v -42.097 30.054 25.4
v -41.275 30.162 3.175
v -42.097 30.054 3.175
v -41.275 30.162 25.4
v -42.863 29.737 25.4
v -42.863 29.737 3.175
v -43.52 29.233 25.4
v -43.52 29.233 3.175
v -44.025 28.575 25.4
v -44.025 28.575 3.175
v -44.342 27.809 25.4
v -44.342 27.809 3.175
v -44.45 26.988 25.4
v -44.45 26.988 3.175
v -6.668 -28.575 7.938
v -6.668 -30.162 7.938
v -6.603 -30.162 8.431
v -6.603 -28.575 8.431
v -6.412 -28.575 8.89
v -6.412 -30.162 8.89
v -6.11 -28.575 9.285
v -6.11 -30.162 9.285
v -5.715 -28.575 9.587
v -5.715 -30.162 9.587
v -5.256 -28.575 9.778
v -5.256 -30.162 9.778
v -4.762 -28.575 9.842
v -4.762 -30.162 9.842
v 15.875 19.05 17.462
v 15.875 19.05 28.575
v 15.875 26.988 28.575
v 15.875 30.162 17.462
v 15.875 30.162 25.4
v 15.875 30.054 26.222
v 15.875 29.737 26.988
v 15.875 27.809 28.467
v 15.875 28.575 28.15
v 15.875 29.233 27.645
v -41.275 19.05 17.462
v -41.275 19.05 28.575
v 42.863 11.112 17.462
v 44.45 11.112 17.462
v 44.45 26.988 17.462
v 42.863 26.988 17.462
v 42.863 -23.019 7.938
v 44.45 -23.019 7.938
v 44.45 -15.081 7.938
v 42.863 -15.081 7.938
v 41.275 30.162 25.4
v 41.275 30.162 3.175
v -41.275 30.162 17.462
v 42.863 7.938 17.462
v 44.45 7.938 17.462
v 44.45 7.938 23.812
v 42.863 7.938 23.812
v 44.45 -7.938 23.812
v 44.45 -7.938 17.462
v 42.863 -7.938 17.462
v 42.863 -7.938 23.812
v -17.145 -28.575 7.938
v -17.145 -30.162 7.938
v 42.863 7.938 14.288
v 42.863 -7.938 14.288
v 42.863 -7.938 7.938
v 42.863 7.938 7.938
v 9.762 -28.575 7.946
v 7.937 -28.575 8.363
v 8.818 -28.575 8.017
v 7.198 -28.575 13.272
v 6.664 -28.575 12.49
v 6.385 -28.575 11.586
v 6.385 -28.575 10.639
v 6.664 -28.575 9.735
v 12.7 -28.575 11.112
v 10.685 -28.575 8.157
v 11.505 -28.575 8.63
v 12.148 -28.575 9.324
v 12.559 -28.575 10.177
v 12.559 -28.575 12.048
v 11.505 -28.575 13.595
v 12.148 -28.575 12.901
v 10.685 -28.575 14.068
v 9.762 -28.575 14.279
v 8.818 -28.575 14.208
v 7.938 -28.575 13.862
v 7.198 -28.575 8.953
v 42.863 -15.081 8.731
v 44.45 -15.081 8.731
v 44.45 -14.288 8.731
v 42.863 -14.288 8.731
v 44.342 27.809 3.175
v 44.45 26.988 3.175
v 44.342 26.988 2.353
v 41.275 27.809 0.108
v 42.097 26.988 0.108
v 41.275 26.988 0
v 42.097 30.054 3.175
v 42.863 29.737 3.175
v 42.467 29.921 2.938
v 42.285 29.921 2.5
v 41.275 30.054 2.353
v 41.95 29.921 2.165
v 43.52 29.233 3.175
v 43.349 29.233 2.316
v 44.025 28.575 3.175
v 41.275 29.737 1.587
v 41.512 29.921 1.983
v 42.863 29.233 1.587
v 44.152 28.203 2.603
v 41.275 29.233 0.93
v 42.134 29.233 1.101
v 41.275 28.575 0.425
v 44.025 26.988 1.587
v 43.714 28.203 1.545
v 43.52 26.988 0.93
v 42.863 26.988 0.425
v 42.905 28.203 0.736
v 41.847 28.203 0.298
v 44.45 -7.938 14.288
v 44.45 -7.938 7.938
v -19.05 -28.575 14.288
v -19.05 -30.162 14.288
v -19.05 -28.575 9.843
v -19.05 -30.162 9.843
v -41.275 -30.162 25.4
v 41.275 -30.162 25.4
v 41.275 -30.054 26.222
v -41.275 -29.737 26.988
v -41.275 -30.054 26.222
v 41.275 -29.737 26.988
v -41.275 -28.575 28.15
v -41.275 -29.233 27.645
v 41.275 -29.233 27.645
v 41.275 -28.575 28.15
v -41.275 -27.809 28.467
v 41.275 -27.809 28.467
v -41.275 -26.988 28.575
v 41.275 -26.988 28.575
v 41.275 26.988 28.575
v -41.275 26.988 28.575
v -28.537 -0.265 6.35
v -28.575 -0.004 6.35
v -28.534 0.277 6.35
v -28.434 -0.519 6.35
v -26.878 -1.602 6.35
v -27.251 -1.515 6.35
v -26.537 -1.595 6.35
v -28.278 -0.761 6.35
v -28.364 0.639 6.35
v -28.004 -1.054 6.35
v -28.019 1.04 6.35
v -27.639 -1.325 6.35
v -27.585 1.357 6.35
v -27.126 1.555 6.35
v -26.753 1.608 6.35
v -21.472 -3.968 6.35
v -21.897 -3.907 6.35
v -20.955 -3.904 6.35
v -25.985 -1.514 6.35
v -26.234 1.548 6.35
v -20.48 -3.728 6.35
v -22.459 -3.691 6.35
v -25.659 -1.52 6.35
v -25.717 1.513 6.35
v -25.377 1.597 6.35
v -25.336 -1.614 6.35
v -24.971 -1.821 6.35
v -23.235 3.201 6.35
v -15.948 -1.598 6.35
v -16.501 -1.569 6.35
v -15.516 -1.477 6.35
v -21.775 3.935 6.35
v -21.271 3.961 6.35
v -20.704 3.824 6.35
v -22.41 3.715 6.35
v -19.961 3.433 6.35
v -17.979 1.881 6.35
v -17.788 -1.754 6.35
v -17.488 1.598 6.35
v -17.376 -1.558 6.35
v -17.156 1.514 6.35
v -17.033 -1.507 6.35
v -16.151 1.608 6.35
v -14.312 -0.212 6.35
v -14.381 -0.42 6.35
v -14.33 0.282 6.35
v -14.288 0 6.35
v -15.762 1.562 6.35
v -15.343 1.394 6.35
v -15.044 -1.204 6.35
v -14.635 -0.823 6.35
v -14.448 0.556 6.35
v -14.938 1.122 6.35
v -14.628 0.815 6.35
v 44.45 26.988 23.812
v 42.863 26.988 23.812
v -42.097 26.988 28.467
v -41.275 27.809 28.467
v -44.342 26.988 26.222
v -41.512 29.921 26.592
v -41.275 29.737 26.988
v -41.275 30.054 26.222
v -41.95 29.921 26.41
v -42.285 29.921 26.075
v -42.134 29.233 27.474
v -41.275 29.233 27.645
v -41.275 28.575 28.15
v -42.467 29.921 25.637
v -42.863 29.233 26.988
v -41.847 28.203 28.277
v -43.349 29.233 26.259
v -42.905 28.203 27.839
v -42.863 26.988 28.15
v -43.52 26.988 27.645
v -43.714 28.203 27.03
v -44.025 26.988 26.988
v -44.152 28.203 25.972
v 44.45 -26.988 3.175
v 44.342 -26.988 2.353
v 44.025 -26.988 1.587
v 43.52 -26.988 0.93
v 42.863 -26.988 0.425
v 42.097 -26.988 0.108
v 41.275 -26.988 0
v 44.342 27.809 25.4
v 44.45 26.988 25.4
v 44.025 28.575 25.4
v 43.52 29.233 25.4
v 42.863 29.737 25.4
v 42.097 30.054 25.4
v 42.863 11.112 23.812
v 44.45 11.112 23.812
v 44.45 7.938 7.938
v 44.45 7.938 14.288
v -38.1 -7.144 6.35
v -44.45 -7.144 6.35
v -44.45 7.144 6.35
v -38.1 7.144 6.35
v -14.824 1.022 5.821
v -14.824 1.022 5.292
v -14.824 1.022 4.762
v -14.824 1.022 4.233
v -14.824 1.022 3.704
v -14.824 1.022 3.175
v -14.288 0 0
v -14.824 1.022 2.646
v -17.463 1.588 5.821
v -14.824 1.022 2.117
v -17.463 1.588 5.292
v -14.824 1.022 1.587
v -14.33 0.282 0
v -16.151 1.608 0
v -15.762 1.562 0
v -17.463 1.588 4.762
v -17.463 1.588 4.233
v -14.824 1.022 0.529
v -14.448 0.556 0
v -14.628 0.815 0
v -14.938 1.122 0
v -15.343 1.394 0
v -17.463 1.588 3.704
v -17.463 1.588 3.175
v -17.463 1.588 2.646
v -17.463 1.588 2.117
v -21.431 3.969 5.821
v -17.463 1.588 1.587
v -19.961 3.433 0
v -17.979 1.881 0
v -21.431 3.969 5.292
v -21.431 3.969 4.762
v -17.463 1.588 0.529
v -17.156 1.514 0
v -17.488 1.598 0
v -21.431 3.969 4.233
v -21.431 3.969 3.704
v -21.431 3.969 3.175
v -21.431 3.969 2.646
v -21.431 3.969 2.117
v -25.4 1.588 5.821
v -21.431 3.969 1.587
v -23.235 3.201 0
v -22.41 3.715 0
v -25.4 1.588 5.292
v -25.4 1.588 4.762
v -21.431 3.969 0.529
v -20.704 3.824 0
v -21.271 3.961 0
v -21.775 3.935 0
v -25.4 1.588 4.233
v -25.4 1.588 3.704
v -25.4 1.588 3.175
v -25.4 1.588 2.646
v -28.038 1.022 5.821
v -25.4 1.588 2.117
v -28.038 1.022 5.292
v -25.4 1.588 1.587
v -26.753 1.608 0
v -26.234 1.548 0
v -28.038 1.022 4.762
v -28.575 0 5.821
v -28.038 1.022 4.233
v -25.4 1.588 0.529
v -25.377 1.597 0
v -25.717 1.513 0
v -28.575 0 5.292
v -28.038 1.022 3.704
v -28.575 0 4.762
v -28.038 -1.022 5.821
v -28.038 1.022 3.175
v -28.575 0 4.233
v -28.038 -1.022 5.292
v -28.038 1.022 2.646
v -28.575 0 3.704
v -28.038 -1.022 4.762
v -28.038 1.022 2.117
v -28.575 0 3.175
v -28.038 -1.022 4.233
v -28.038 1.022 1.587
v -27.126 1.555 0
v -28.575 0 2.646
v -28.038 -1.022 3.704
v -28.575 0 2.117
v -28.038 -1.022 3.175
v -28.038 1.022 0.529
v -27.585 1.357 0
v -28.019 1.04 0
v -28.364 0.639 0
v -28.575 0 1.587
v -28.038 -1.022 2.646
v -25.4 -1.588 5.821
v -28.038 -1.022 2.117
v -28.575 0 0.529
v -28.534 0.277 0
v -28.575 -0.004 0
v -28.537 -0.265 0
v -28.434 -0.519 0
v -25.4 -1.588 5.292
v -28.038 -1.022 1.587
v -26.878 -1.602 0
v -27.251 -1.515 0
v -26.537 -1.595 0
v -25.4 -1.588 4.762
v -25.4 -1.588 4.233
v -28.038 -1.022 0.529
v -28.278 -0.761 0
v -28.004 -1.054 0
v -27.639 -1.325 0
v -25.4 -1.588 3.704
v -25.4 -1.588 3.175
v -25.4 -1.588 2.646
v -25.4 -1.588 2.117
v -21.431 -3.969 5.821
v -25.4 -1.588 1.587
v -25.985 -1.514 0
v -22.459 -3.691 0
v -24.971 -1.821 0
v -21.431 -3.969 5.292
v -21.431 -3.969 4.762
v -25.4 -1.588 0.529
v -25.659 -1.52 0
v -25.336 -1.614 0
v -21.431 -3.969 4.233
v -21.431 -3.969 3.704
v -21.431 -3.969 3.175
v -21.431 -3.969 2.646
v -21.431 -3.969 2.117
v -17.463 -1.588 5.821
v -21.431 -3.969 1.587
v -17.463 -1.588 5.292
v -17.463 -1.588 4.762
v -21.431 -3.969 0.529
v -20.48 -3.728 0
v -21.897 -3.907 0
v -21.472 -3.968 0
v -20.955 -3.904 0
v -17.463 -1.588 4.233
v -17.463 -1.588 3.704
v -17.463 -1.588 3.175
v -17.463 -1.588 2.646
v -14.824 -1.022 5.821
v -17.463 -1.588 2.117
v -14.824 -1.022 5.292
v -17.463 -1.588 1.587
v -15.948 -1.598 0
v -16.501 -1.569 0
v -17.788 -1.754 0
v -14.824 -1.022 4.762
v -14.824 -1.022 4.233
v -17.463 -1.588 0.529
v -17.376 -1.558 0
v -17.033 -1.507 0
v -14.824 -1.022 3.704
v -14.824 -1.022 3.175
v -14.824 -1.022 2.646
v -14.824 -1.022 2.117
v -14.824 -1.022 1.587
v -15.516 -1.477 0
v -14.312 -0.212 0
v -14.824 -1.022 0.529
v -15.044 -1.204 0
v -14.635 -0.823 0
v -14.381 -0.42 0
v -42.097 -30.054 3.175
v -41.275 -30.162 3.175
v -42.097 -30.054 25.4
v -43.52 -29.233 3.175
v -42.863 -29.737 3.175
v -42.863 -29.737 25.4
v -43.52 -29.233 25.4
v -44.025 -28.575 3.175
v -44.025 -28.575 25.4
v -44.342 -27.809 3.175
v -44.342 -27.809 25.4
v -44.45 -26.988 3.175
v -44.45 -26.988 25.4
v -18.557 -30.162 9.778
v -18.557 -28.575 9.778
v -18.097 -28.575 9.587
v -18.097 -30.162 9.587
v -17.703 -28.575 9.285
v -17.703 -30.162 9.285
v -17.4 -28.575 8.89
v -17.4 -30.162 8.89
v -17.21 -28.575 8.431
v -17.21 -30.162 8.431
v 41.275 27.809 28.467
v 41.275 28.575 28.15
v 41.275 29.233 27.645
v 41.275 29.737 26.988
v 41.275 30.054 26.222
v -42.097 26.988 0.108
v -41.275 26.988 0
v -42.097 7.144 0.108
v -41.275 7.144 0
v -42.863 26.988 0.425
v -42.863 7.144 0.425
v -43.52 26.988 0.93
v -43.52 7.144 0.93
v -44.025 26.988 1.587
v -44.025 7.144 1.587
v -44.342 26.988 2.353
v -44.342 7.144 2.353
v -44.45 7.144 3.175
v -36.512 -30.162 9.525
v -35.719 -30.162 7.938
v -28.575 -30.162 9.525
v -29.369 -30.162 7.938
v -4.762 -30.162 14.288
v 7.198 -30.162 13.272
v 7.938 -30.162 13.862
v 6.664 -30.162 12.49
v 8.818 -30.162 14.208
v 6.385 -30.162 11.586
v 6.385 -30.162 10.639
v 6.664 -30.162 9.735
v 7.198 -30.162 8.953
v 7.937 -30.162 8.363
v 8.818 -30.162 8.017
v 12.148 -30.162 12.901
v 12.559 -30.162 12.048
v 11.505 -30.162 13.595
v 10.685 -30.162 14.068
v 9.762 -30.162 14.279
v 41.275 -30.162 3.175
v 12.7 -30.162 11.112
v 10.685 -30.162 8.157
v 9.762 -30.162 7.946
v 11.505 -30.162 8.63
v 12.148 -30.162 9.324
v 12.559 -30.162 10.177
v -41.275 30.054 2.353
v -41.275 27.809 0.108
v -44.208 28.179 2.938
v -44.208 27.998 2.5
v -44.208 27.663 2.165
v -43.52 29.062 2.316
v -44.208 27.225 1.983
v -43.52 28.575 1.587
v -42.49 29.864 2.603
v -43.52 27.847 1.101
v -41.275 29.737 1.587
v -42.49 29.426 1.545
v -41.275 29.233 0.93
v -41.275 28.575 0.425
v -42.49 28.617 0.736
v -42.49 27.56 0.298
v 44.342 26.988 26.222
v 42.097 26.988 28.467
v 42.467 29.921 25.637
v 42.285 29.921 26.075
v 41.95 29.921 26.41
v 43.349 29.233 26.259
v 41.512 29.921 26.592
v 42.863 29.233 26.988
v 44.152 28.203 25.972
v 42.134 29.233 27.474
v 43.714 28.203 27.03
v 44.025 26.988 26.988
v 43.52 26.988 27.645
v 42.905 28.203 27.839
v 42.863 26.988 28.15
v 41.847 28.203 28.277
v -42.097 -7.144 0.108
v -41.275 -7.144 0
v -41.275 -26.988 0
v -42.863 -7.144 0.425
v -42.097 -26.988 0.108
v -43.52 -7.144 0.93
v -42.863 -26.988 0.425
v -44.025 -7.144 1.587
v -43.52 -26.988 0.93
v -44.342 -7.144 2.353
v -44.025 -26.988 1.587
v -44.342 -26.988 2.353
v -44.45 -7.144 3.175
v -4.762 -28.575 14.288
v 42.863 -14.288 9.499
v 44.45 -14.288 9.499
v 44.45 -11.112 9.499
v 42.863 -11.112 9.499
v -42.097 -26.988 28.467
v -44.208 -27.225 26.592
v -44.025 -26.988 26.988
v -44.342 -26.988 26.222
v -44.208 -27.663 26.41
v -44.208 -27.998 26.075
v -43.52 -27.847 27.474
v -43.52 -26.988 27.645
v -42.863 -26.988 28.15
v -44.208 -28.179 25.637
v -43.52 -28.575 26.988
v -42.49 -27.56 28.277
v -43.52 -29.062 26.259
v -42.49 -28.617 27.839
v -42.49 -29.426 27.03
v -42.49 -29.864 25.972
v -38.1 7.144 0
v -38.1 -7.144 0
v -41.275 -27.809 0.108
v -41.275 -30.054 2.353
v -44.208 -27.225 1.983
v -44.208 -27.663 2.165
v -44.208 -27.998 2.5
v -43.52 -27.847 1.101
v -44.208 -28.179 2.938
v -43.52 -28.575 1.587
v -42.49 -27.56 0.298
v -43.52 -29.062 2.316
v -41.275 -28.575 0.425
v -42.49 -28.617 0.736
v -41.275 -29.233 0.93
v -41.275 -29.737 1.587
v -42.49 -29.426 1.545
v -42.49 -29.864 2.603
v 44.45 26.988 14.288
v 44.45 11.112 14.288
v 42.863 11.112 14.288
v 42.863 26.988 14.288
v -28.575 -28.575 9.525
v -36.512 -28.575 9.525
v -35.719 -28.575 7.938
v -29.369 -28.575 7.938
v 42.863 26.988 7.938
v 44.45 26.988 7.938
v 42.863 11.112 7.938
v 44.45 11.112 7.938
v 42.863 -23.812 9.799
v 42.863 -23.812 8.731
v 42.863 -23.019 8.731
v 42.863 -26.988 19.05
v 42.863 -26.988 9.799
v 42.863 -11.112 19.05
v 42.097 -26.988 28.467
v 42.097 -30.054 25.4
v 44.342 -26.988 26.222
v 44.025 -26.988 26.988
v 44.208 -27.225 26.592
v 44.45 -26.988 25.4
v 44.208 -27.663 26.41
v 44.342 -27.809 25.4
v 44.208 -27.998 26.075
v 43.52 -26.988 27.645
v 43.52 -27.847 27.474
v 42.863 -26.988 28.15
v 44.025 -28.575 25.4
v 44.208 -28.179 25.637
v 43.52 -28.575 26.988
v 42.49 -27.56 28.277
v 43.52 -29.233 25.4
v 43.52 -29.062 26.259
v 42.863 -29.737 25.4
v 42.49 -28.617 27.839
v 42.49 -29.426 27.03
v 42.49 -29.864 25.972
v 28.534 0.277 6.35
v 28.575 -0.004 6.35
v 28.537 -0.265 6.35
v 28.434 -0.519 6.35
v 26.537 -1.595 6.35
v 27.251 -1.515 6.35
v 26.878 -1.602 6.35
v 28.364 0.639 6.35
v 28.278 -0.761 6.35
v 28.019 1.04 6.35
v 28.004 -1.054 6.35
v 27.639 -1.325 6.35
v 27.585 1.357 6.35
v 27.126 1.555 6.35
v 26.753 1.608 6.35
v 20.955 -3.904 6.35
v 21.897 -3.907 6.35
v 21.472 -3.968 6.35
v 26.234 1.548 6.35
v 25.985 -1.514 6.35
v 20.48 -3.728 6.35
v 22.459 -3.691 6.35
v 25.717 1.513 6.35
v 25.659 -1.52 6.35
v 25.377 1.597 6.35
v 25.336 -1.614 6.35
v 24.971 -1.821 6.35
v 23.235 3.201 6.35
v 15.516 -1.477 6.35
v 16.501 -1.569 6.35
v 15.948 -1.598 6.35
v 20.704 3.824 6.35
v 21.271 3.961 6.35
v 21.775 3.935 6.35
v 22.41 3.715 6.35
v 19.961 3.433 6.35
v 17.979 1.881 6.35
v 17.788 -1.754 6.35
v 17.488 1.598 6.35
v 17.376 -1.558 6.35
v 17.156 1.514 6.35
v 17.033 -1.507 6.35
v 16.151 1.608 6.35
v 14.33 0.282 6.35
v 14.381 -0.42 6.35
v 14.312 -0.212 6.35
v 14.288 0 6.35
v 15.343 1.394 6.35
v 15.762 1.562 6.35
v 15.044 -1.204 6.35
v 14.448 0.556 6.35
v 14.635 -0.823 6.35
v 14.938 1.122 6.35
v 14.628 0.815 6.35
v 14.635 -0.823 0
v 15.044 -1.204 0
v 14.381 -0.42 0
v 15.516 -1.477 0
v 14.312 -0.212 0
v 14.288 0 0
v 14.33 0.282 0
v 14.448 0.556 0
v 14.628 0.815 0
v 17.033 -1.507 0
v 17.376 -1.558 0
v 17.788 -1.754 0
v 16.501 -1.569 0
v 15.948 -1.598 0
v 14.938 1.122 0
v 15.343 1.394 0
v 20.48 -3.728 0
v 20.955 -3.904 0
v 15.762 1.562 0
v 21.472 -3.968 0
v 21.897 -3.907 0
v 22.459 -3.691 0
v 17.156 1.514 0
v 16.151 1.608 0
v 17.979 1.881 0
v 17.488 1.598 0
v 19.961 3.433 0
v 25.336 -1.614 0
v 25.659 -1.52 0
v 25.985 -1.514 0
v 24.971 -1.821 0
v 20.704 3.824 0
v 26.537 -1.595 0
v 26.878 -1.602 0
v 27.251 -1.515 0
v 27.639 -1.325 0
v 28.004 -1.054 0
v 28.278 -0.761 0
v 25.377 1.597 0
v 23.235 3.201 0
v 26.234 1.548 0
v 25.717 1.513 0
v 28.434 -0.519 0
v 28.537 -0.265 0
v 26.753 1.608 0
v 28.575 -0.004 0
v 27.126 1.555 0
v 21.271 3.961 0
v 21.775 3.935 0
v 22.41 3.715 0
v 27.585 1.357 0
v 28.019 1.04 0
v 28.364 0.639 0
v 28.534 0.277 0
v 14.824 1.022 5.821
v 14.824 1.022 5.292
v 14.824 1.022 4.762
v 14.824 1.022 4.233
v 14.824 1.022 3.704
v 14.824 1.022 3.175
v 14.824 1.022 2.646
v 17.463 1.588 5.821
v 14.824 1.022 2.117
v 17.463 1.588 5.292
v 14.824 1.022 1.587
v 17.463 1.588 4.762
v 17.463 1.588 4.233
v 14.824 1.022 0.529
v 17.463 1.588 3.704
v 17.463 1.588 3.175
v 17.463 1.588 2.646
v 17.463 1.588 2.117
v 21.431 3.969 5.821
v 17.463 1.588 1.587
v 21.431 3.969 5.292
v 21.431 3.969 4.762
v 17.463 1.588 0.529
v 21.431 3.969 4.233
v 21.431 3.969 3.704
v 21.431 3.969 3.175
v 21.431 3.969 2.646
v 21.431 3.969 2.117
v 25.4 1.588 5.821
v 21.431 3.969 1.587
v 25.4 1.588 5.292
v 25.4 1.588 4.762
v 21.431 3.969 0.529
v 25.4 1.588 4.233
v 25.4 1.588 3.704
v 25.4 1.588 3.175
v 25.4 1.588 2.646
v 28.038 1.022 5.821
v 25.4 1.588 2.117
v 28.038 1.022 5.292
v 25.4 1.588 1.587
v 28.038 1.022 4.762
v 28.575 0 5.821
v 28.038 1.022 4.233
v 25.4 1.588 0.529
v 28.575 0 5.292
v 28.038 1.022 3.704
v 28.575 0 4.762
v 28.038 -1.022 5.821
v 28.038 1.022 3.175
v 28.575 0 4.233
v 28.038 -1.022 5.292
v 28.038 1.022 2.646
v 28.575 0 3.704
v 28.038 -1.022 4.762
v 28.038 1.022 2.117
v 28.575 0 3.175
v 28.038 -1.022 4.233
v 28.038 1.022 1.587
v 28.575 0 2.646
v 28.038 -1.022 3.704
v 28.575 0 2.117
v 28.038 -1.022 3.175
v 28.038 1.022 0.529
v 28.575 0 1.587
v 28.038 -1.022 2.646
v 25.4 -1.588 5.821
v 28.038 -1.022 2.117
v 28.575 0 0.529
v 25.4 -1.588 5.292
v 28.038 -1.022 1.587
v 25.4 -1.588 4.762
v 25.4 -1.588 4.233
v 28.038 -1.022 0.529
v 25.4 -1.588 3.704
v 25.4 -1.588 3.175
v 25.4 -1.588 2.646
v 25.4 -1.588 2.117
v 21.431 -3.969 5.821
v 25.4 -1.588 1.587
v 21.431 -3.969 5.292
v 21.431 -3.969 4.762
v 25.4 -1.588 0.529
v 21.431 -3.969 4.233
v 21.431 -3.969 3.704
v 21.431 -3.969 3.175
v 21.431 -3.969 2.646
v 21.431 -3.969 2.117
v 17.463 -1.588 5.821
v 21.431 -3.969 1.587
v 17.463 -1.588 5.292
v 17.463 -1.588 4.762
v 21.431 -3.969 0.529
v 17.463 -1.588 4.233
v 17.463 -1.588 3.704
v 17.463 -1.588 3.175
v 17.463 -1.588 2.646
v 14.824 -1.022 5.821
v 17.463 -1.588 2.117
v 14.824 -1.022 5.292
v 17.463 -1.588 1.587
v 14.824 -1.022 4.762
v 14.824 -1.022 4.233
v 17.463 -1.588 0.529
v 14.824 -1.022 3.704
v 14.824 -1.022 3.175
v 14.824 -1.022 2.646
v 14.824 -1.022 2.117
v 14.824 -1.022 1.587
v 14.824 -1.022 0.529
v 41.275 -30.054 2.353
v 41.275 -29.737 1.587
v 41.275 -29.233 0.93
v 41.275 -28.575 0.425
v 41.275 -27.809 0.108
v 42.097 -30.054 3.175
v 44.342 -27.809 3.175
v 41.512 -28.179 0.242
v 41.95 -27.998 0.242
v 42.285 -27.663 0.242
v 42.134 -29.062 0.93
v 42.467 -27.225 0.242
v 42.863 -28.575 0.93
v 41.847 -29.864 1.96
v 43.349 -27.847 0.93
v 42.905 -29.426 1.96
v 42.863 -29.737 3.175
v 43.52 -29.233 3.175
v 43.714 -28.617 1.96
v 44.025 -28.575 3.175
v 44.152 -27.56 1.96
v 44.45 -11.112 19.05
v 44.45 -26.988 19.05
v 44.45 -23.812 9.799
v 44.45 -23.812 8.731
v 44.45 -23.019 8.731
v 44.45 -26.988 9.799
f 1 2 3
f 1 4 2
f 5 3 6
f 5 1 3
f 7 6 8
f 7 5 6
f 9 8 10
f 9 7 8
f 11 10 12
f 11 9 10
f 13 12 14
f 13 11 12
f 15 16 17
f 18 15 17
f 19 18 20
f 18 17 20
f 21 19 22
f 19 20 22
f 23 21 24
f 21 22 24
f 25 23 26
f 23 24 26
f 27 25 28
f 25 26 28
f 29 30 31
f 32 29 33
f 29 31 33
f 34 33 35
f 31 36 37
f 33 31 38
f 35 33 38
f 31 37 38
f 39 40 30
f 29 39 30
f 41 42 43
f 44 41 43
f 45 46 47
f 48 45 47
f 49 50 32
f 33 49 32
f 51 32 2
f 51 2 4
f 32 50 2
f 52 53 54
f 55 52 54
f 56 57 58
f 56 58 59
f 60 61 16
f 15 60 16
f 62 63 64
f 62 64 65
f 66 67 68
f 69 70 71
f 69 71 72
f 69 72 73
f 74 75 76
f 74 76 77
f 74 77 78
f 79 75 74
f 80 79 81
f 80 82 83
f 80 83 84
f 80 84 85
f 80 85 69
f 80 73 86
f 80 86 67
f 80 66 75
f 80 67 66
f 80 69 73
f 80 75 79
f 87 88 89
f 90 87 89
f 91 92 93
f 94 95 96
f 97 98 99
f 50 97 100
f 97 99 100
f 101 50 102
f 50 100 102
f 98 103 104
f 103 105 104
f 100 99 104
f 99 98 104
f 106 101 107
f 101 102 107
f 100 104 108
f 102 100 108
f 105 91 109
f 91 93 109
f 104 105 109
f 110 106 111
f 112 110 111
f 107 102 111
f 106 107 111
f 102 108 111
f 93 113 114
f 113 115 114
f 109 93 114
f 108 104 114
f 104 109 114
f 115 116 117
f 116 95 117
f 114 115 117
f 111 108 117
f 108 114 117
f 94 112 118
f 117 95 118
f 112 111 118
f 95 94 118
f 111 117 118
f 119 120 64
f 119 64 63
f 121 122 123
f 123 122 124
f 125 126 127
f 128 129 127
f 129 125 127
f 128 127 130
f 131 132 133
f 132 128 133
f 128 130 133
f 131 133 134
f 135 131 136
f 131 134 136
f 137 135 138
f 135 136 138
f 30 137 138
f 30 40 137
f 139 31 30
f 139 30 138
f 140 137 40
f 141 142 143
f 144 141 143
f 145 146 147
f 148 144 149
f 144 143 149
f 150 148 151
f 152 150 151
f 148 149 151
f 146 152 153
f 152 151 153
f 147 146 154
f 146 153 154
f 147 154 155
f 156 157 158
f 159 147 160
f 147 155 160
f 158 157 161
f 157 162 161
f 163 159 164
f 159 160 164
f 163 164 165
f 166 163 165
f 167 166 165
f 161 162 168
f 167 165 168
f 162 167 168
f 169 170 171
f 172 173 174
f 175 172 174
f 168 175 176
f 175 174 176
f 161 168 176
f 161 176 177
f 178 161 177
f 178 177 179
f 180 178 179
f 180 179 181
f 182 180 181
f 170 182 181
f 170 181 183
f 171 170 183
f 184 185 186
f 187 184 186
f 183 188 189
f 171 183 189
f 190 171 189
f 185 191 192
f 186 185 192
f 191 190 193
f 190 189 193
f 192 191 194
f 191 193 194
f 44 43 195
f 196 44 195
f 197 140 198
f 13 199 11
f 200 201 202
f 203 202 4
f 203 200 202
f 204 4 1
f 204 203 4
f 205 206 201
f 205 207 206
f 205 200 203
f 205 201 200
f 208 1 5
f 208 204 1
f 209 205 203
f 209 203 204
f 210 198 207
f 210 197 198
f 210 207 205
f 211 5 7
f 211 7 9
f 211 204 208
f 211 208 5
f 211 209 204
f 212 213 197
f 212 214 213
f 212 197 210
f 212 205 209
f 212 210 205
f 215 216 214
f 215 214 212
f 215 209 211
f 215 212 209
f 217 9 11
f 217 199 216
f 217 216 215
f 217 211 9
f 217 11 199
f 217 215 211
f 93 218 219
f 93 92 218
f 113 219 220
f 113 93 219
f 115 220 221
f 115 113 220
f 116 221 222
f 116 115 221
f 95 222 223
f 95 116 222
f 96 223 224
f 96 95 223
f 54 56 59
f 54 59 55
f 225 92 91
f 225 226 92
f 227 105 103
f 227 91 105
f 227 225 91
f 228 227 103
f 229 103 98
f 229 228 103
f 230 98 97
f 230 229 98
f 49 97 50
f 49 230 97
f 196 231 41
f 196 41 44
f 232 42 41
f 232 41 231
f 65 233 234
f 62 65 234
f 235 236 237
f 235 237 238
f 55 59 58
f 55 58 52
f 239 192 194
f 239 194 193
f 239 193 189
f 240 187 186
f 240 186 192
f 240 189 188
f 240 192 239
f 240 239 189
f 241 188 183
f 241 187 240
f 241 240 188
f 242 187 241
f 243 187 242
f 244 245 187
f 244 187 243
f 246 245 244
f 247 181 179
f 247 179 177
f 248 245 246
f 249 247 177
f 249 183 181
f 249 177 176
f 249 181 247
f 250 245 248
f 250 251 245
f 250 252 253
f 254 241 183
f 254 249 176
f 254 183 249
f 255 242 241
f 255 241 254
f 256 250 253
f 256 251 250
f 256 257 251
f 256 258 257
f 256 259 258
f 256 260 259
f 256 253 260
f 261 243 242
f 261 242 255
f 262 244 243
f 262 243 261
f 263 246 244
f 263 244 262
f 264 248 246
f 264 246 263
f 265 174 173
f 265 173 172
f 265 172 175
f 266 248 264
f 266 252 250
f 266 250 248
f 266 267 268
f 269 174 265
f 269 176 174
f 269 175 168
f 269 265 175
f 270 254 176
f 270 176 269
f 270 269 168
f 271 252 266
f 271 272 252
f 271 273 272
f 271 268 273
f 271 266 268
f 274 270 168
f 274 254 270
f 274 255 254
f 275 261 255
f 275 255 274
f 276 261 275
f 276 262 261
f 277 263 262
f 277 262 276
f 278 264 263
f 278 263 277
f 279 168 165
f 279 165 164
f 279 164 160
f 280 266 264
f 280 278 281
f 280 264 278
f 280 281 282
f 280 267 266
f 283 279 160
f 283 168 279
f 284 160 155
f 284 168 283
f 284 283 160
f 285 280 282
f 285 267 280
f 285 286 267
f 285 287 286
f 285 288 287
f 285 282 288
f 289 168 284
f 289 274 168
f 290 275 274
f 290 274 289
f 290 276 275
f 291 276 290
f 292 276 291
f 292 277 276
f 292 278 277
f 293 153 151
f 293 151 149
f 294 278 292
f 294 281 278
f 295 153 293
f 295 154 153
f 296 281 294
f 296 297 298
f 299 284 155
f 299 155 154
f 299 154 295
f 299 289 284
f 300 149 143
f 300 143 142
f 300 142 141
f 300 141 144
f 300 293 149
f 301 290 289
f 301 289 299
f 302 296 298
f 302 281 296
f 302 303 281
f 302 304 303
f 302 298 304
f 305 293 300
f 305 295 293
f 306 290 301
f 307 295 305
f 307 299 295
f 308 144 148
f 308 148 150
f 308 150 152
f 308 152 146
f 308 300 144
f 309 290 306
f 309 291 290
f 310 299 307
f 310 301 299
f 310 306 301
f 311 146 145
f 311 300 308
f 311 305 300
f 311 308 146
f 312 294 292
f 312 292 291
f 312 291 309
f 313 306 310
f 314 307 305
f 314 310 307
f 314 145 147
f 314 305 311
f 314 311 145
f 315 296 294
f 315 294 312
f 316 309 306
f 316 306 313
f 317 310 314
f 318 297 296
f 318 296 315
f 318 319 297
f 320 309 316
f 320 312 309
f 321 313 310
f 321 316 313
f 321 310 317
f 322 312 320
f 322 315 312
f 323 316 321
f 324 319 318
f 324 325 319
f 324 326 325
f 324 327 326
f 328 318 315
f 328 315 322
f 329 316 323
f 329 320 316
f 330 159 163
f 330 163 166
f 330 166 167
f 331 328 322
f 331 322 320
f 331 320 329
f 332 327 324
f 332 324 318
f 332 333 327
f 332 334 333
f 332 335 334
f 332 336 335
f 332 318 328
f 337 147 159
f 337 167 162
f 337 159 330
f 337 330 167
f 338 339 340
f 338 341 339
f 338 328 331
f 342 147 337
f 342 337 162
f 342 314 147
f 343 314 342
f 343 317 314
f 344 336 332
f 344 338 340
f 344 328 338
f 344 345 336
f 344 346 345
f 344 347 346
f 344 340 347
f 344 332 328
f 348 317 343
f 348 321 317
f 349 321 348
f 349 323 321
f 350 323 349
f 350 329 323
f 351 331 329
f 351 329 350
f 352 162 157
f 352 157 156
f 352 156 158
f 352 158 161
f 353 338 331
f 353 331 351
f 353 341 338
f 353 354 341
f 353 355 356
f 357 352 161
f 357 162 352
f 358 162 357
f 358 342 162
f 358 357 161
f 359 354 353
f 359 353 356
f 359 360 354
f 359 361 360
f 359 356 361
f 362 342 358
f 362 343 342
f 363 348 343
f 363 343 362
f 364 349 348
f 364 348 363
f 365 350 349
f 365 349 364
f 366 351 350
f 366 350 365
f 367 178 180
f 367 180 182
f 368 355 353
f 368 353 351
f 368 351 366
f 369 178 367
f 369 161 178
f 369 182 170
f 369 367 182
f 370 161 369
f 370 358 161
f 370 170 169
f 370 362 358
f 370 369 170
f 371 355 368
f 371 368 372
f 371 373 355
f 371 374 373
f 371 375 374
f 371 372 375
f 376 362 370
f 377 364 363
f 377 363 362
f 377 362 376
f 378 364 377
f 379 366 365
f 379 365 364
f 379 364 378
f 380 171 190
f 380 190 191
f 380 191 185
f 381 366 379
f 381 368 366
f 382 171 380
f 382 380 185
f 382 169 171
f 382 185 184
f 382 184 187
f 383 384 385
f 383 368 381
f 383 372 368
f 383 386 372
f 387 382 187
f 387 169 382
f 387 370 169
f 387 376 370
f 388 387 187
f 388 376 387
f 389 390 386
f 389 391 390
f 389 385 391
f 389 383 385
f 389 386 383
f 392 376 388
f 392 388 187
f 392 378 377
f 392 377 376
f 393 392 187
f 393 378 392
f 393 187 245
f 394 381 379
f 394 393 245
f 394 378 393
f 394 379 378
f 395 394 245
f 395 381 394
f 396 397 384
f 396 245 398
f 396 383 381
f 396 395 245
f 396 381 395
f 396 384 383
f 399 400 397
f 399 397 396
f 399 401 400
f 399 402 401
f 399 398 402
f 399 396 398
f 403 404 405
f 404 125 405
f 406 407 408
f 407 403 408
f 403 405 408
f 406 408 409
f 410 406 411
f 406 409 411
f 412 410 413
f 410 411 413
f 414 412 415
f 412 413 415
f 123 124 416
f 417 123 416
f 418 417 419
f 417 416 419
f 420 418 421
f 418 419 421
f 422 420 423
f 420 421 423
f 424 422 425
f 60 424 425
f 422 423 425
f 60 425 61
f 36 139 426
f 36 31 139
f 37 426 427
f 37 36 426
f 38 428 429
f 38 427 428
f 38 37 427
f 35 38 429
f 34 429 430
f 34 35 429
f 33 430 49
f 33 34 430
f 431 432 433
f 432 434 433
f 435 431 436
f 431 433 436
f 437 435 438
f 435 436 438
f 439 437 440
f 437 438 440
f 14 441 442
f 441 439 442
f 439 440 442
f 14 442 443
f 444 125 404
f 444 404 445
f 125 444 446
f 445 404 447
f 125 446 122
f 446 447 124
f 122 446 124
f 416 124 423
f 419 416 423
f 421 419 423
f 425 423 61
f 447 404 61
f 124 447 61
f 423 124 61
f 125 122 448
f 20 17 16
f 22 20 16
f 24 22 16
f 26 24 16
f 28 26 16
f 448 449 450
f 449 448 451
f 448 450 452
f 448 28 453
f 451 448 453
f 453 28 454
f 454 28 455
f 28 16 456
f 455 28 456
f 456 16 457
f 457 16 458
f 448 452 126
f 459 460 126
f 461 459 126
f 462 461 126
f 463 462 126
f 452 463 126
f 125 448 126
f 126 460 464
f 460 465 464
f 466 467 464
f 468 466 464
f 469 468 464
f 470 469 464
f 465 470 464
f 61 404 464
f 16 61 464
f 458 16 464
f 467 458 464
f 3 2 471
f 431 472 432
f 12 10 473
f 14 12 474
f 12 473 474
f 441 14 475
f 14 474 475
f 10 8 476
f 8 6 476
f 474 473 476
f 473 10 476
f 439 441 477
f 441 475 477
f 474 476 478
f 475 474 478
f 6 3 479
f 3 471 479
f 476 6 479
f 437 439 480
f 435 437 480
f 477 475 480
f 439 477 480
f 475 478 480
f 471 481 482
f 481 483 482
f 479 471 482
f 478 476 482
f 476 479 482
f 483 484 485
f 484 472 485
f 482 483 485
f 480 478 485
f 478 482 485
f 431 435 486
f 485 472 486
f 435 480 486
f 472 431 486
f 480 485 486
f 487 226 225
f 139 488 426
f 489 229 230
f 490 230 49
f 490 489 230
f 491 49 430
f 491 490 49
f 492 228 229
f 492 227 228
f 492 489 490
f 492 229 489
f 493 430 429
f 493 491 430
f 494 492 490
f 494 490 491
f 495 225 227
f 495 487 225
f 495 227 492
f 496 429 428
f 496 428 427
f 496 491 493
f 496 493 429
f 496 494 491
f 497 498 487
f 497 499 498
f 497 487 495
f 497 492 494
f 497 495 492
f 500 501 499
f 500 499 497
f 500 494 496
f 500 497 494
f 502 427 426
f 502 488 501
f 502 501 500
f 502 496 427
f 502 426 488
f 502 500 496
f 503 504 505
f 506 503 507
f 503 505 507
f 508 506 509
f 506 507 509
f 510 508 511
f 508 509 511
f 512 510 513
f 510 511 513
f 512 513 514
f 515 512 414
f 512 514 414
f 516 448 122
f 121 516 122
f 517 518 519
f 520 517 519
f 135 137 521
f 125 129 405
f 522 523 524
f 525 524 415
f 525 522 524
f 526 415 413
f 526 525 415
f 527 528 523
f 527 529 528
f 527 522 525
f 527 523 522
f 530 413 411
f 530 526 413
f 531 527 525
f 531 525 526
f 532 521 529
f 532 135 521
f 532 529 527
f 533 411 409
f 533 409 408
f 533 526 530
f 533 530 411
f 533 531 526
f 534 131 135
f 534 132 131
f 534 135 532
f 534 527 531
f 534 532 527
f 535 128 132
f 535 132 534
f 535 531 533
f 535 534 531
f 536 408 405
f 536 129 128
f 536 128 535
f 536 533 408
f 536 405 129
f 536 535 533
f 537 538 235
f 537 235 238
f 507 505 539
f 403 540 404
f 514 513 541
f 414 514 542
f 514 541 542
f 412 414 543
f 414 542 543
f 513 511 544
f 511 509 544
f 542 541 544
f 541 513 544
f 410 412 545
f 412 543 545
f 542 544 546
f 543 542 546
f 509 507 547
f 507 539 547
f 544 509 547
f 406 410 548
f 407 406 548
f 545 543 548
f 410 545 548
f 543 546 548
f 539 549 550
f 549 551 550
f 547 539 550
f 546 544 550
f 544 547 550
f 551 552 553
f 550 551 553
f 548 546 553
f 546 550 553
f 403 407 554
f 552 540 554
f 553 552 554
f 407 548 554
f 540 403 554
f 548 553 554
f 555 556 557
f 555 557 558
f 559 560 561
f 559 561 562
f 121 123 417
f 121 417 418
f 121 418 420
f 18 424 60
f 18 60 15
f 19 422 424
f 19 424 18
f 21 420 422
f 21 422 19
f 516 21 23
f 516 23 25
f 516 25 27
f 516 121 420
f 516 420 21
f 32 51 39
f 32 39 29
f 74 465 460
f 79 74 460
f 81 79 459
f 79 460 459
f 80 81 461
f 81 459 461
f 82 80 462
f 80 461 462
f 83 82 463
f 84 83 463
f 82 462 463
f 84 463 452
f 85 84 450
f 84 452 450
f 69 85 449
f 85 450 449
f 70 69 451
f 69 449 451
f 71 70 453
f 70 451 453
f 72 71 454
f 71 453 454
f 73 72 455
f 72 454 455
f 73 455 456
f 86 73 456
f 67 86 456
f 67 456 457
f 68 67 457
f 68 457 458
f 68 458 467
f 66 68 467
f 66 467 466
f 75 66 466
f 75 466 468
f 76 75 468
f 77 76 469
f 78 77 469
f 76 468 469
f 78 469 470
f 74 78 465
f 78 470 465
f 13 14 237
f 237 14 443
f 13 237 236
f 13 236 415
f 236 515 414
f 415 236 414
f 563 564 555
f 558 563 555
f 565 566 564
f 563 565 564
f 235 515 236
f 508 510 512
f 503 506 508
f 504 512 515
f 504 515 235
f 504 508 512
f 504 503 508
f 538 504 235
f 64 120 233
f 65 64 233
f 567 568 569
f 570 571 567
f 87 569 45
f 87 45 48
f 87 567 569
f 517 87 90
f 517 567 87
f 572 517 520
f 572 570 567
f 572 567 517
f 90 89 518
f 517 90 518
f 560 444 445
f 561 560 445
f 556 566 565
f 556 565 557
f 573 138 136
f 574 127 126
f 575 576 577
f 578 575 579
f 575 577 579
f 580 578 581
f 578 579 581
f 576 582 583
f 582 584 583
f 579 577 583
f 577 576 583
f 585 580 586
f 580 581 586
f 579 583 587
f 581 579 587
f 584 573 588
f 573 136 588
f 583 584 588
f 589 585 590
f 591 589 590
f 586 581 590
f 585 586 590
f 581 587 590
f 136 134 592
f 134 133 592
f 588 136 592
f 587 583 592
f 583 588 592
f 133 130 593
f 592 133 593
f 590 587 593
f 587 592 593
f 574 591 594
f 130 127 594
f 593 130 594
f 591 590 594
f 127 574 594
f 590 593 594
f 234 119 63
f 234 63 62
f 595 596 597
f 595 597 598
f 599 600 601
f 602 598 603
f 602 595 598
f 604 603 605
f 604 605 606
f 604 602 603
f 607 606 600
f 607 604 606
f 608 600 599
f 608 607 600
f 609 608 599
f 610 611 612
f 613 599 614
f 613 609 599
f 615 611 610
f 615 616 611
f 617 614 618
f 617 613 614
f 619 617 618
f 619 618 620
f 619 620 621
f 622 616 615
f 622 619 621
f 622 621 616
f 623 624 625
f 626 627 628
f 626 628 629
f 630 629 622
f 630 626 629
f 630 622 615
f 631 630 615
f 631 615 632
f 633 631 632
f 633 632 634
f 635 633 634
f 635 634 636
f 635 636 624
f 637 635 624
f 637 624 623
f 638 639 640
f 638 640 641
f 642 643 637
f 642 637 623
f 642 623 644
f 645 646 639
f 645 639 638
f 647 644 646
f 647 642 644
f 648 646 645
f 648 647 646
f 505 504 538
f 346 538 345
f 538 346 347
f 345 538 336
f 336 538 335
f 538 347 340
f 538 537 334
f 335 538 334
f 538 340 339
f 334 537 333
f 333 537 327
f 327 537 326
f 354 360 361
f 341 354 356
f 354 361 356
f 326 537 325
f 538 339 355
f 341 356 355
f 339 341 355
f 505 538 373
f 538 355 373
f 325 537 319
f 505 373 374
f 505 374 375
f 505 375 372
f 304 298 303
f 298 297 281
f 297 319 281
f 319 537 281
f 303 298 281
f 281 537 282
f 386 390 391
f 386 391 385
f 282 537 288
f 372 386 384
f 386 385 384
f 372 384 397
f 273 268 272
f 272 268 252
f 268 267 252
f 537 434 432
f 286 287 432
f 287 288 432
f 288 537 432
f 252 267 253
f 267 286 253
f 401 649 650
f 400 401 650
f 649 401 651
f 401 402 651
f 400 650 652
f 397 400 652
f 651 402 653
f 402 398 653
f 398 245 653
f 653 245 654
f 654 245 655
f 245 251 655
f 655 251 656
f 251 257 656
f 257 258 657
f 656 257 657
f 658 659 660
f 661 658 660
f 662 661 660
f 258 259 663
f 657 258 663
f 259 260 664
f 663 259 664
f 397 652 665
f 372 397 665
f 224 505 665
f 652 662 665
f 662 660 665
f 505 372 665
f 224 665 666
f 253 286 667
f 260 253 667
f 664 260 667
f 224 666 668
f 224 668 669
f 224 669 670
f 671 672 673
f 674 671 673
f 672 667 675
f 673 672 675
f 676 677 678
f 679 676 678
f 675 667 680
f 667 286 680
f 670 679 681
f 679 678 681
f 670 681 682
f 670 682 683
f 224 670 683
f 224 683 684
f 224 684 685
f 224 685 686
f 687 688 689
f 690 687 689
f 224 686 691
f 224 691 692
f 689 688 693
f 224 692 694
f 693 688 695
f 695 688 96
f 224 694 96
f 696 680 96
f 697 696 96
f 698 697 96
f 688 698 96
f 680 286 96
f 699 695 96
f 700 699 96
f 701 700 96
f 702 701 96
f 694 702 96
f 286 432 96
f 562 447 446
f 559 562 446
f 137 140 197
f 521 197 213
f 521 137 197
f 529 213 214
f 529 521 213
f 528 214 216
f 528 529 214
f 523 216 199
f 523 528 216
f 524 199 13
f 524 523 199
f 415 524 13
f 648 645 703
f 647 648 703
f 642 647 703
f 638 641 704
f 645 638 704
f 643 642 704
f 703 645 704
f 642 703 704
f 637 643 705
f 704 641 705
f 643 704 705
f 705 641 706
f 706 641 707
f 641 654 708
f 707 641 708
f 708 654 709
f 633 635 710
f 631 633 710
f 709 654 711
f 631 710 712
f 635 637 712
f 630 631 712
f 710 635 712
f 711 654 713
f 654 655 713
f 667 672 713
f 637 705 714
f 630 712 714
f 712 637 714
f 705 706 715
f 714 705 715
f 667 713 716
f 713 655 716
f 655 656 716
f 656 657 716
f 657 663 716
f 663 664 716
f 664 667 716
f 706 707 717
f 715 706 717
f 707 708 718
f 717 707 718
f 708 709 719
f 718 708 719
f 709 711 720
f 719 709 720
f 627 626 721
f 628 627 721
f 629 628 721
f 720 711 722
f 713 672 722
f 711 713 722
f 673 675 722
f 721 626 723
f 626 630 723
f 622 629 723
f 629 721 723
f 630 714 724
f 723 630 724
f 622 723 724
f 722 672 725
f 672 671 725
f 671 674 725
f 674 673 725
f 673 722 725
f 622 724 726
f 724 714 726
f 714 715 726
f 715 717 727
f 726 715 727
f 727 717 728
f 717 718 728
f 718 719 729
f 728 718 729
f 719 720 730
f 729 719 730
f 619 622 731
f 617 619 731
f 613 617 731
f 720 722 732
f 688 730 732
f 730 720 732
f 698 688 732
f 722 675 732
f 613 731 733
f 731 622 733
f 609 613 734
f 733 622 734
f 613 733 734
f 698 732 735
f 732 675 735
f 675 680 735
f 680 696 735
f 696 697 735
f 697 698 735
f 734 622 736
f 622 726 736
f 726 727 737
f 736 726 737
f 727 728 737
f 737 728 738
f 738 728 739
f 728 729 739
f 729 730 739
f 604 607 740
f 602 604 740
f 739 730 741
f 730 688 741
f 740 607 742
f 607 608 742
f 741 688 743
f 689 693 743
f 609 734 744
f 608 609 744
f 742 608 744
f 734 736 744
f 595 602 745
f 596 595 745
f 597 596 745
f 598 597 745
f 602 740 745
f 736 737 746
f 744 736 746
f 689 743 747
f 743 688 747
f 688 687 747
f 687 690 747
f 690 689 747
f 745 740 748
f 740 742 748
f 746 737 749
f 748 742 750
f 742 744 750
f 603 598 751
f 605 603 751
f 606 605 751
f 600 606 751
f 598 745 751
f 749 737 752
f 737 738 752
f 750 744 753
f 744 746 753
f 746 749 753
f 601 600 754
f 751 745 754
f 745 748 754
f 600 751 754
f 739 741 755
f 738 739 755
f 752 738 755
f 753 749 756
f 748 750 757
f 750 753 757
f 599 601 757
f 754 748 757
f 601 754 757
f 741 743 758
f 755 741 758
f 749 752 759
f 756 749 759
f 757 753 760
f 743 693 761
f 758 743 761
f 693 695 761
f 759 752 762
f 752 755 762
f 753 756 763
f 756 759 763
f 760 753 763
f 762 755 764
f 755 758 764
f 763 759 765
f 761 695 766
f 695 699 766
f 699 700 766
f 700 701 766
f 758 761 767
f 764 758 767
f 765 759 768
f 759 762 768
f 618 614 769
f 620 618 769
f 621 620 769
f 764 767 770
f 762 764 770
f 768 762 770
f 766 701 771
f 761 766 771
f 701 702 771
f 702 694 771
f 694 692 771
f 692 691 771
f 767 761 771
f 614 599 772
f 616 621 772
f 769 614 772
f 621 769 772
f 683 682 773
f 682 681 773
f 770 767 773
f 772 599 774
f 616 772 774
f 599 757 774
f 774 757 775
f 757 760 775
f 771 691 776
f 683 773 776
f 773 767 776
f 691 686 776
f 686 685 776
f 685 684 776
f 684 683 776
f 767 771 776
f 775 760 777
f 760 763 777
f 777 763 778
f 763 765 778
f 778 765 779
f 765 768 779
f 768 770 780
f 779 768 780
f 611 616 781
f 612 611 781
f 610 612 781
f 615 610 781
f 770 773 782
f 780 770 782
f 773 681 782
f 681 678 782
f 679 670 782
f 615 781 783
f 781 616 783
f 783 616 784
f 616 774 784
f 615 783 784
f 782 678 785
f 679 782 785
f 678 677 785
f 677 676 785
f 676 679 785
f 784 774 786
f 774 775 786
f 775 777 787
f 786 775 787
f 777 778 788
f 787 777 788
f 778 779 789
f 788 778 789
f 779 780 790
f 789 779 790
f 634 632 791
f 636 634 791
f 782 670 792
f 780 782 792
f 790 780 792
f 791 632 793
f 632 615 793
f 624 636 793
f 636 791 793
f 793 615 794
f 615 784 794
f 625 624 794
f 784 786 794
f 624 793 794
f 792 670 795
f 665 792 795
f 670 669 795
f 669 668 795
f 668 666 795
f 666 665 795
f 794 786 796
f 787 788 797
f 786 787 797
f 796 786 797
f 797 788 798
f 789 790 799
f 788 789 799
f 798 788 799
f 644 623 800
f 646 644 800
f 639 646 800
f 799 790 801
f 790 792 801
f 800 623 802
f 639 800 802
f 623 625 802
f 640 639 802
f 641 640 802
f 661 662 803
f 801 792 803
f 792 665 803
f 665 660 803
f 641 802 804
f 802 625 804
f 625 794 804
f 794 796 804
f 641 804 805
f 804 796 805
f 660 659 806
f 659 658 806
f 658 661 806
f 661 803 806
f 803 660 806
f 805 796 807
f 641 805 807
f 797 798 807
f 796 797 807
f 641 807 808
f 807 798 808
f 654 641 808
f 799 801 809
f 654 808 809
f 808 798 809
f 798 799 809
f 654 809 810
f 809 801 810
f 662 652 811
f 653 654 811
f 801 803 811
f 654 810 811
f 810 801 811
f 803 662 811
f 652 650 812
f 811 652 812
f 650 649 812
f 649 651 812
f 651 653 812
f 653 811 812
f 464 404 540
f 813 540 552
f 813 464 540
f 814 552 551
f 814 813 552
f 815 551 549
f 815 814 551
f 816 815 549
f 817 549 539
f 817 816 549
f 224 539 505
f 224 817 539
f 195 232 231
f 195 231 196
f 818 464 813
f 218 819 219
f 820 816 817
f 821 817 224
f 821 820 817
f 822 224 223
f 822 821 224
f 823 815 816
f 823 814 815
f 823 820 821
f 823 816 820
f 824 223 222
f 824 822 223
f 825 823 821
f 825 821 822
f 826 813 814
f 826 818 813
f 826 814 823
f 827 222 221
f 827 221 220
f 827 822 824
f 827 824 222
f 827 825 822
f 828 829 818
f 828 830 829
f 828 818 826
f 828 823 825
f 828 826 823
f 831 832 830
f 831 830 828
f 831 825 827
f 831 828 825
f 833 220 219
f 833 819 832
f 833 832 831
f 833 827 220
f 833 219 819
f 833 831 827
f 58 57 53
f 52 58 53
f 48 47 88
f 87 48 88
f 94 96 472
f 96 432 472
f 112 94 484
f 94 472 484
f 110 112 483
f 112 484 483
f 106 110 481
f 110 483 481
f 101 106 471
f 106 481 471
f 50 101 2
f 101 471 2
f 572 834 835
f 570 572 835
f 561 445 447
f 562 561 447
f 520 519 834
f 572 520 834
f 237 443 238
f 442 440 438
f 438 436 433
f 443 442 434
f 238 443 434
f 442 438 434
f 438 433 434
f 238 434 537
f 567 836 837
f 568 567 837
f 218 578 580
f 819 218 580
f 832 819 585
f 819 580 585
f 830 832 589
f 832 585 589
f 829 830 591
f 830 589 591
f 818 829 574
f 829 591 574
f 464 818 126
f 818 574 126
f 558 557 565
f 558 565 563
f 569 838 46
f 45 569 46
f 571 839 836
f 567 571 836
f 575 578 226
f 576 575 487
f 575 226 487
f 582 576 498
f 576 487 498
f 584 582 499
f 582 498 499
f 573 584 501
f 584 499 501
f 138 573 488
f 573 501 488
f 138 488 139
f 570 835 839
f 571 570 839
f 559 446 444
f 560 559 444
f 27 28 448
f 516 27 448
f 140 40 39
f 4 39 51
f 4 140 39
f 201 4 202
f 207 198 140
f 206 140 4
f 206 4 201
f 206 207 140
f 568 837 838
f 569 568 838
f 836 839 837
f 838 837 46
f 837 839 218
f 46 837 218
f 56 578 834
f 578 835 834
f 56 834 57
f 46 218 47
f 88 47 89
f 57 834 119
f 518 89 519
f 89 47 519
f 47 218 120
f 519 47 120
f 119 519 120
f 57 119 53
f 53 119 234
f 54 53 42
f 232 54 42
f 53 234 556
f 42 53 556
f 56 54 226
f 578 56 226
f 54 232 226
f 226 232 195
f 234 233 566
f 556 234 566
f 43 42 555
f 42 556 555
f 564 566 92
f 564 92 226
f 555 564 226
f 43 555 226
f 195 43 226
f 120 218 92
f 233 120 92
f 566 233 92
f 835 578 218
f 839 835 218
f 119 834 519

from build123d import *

# Parameters (mm, degrees)
F0_W     = 6.35
F0_H     = 7.14375
F1_DEPTH = 28.575
F2_DEPTH = 6.35
F4_W     = 15.875
F4_H     = 6.35
F5_DEPTH = 1.5875
F3_R     = 3.175
F6_DEPTH = 1.5875
F7_W     = 57.15
F7_H     = 11.1125
F8_DEPTH = 11.1125
F9_R     = 3.17499


# Not quite as in the source:
# - a fillet or chamfer is up to 0.001 mm smaller than in the source, because OpenCascade refuses the exact size


with BuildPart() as f1:
    # F0 (on Top) → F1 (new body)
    with BuildSketch(Plane.XY):
        Polygon((44.45, -30.1625), (44.45, 30.1625), (-44.45, 30.1625), (-44.45, 7.14375), (-38.1, 7.14375), (-38.1, 0), (-38.1, -7.14375), (-44.45, -7.14375), (-44.45, -30.1625), align=None)
        with BuildLine():
            add(Edge.make_bspline(
                [(-14.2875, 0), (-14.2875, 0.7324493897), (-15.9479784808, 2.0808128457), (-17.5976715514, 0.8021829538), (-21.43125, 5.9657530394), (-25.2648284486, 0.8021829538), (-26.9145215192, 2.0808128457), (-29.4769945213, 0), (-26.9145215192, -2.0808128457), (-25.2648284486, -0.8021829538), (-21.43125, -5.9657530394), (-17.5976715514, -0.8021829538), (-15.9479784808, -2.0808128457), (-14.2875, -0.7324493897), (-14.2875, 0)],
                knots=[0, 0, 0, 0, 0.0762961044, 0.1404532251, 0.25, 0.3595467749, 0.4237038956, 0.5, 0.5762961044, 0.6404532251, 0.75, 0.8595467749, 0.9237038956, 1, 1, 1, 1], degree=3))
        make_face(mode=Mode.SUBTRACT)
        with BuildLine():
            add(Edge.make_bspline(
                [(14.2875, 0), (14.2875, 0.7324493897), (15.9479784808, 2.0808128457), (17.5976715514, 0.8021829538), (21.43125, 5.9657530394), (25.2648284486, 0.8021829538), (26.9145215192, 2.0808128457), (29.4769945213, 0), (26.9145215192, -2.0808128457), (25.2648284486, -0.8021829538), (21.43125, -5.9657530394), (17.5976715514, -0.8021829538), (15.9479784808, -2.0808128457), (14.2875, -0.7324493897), (14.2875, 0)],
                knots=[0, 0, 0, 0, 0.0762961044, 0.1404532251, 0.25, 0.3595467749, 0.4237038956, 0.5, 0.5762961044, 0.6404532251, 0.75, 0.8595467749, 0.9237038956, 1, 1, 1, 1], degree=3))
        make_face(mode=Mode.SUBTRACT)
        with Locations((-41.275, 3.571875)):
            Rectangle(F0_W, F0_H)
        with Locations((-41.275, -3.571875)):
            Rectangle(F0_W, F0_H)
        with BuildLine():
            add(Edge.make_bspline(
                [(-14.2875, 0), (-14.2875, 0.7324493897), (-15.9479784808, 2.0808128457), (-17.5976715514, 0.8021829538), (-21.43125, 5.9657530394), (-25.2648284486, 0.8021829538), (-26.9145215192, 2.0808128457), (-29.4769945213, 0), (-26.9145215192, -2.0808128457), (-25.2648284486, -0.8021829538), (-21.43125, -5.9657530394), (-17.5976715514, -0.8021829538), (-15.9479784808, -2.0808128457), (-14.2875, -0.7324493897), (-14.2875, 0)],
                knots=[0, 0, 0, 0, 0.0762961044, 0.1404532251, 0.25, 0.3595467749, 0.4237038956, 0.5, 0.5762961044, 0.6404532251, 0.75, 0.8595467749, 0.9237038956, 1, 1, 1, 1], degree=3))
        make_face()
        with BuildLine():
            add(Edge.make_bspline(
                [(14.2875, 0), (14.2875, 0.7324493897), (15.9479784808, 2.0808128457), (17.5976715514, 0.8021829538), (21.43125, 5.9657530394), (25.2648284486, 0.8021829538), (26.9145215192, 2.0808128457), (29.4769945213, 0), (26.9145215192, -2.0808128457), (25.2648284486, -0.8021829538), (21.43125, -5.9657530394), (17.5976715514, -0.8021829538), (15.9479784808, -2.0808128457), (14.2875, -0.7324493897), (14.2875, 0)],
                knots=[0, 0, 0, 0, 0.0762961044, 0.1404532251, 0.25, 0.3595467749, 0.4237038956, 0.5, 0.5762961044, 0.6404532251, 0.75, 0.8595467749, 0.9237038956, 1, 1, 1, 1], degree=3))
        make_face()
    extrude(amount=F1_DEPTH)

    # F0 (on Top) → F2 (cut)
    with BuildSketch(Plane.XY):
        with Locations((-41.275, 3.571875)):
            Rectangle(F0_W, F0_H)
        with Locations((-41.275, -3.571875)):
            Rectangle(F0_W, F0_H)
        with BuildLine():
            add(Edge.make_bspline(
                [(-14.2875, 0), (-14.2875, 0.7324493897), (-15.9479784808, 2.0808128457), (-17.5976715514, 0.8021829538), (-21.43125, 5.9657530394), (-25.2648284486, 0.8021829538), (-26.9145215192, 2.0808128457), (-29.4769945213, 0), (-26.9145215192, -2.0808128457), (-25.2648284486, -0.8021829538), (-21.43125, -5.9657530394), (-17.5976715514, -0.8021829538), (-15.9479784808, -2.0808128457), (-14.2875, -0.7324493897), (-14.2875, 0)],
                knots=[0, 0, 0, 0, 0.0762961044, 0.1404532251, 0.25, 0.3595467749, 0.4237038956, 0.5, 0.5762961044, 0.6404532251, 0.75, 0.8595467749, 0.9237038956, 1, 1, 1, 1], degree=3))
        make_face()
        with BuildLine():
            add(Edge.make_bspline(
                [(14.2875, 0), (14.2875, 0.7324493897), (15.9479784808, 2.0808128457), (17.5976715514, 0.8021829538), (21.43125, 5.9657530394), (25.2648284486, 0.8021829538), (26.9145215192, 2.0808128457), (29.4769945213, 0), (26.9145215192, -2.0808128457), (25.2648284486, -0.8021829538), (21.43125, -5.9657530394), (17.5976715514, -0.8021829538), (15.9479784808, -2.0808128457), (14.2875, -0.7324493897), (14.2875, 0)],
                knots=[0, 0, 0, 0, 0.0762961044, 0.1404532251, 0.25, 0.3595467749, 0.4237038956, 0.5, 0.5762961044, 0.6404532251, 0.75, 0.8595467749, 0.9237038956, 1, 1, 1, 1], degree=3))
        make_face()
    extrude(amount=F2_DEPTH, mode=Mode.SUBTRACT)

    # F4 (on face) → F5 (cut)
    with BuildSketch(Plane.YZ.offset(44.45)):
        with Locations((19.05, 11.1125)):
            Rectangle(F4_W, F4_H)
        with Locations((19.05, 20.6375)):
            Rectangle(F4_W, F4_H)
        with Locations((0, 11.1125)):
            Rectangle(F4_W, F4_H)
        with Locations((0, 20.6375)):
            Rectangle(F4_W, F4_H)
        Polygon((-11.1125, 19.05), (-26.9875, 19.05), (-26.9875, 9.7991283983), (-23.8125, 9.7991283983), (-23.8125, 8.73125), (-23.01875, 8.73125), (-23.01875, 7.9375), (-15.08125, 7.9375), (-15.08125, 8.73125), (-14.2875, 8.73125), (-14.2875, 9.4989752397), (-11.1125, 9.4989752397), align=None)
    extrude(amount=-F5_DEPTH, mode=Mode.SUBTRACT)

    # F3 (on face) → F6 (cut)
    with BuildSketch(Plane.XZ.offset(30.1625)):
        Polygon((-28.575, 9.525), (-36.5125, 9.525), (-35.71875, 7.9375), (-29.36875, 7.9375), align=None)
        with BuildLine():
            Line((-4.7625, 14.2875), (-19.05, 14.2875))
            Line((-19.05, 14.2875), (-19.05, 9.8425))
            ThreePointArc((-19.05, 9.8425), (-17.7029615818, 9.2845384182), (-17.145, 7.9375))
            Line((-17.145, 7.9375), (-6.6675, 7.9375))
            ThreePointArc((-6.6675, 7.9375), (-6.1095384182, 9.2845384182), (-4.7625, 9.8425))
            Line((-4.7625, 9.8425), (-4.7625, 14.2875))
        make_face()
        with Locations((9.525, 11.1125)):
            Circle(F3_R)
    extrude(amount=-F6_DEPTH, mode=Mode.SUBTRACT)

    # F7 (on face) → F8 (cut)
    with BuildSketch(Plane.XY.offset(28.575)):
        with Locations((-12.7, 24.60625)):
            Rectangle(F7_W, F7_H)
    extrude(amount=-F8_DEPTH, mode=Mode.SUBTRACT)

    # F9 (radius 3.175 in the source; OpenCascade refuses exactly that, so slightly less here)
    f9_edges = [f1.edges().sort_by_distance(p)[0] for p in [
        (0, -30.1625, 28.575),
        (-44.45, 0, 28.575),
        (44.45, 0, 28.575),
        (44.45, -30.1625, 14.2875),
        (0, -30.1625, 0),
        (44.45, 0, 0),
        (44.45, 30.1625, 14.2875),
        (-42.8625, 30.1625, 28.575),
        (30.1625, 30.1625, 28.575),
        (0, 30.1625, 0),
        (-44.45, 30.1625, 14.2875),
        (-44.45, 18.653125, 0),
        (-44.45, -18.653125, 0),
        (-44.45, -30.1625, 14.2875),
    ]]
    fillet(f9_edges, radius=F9_R)


solid = f1.part
